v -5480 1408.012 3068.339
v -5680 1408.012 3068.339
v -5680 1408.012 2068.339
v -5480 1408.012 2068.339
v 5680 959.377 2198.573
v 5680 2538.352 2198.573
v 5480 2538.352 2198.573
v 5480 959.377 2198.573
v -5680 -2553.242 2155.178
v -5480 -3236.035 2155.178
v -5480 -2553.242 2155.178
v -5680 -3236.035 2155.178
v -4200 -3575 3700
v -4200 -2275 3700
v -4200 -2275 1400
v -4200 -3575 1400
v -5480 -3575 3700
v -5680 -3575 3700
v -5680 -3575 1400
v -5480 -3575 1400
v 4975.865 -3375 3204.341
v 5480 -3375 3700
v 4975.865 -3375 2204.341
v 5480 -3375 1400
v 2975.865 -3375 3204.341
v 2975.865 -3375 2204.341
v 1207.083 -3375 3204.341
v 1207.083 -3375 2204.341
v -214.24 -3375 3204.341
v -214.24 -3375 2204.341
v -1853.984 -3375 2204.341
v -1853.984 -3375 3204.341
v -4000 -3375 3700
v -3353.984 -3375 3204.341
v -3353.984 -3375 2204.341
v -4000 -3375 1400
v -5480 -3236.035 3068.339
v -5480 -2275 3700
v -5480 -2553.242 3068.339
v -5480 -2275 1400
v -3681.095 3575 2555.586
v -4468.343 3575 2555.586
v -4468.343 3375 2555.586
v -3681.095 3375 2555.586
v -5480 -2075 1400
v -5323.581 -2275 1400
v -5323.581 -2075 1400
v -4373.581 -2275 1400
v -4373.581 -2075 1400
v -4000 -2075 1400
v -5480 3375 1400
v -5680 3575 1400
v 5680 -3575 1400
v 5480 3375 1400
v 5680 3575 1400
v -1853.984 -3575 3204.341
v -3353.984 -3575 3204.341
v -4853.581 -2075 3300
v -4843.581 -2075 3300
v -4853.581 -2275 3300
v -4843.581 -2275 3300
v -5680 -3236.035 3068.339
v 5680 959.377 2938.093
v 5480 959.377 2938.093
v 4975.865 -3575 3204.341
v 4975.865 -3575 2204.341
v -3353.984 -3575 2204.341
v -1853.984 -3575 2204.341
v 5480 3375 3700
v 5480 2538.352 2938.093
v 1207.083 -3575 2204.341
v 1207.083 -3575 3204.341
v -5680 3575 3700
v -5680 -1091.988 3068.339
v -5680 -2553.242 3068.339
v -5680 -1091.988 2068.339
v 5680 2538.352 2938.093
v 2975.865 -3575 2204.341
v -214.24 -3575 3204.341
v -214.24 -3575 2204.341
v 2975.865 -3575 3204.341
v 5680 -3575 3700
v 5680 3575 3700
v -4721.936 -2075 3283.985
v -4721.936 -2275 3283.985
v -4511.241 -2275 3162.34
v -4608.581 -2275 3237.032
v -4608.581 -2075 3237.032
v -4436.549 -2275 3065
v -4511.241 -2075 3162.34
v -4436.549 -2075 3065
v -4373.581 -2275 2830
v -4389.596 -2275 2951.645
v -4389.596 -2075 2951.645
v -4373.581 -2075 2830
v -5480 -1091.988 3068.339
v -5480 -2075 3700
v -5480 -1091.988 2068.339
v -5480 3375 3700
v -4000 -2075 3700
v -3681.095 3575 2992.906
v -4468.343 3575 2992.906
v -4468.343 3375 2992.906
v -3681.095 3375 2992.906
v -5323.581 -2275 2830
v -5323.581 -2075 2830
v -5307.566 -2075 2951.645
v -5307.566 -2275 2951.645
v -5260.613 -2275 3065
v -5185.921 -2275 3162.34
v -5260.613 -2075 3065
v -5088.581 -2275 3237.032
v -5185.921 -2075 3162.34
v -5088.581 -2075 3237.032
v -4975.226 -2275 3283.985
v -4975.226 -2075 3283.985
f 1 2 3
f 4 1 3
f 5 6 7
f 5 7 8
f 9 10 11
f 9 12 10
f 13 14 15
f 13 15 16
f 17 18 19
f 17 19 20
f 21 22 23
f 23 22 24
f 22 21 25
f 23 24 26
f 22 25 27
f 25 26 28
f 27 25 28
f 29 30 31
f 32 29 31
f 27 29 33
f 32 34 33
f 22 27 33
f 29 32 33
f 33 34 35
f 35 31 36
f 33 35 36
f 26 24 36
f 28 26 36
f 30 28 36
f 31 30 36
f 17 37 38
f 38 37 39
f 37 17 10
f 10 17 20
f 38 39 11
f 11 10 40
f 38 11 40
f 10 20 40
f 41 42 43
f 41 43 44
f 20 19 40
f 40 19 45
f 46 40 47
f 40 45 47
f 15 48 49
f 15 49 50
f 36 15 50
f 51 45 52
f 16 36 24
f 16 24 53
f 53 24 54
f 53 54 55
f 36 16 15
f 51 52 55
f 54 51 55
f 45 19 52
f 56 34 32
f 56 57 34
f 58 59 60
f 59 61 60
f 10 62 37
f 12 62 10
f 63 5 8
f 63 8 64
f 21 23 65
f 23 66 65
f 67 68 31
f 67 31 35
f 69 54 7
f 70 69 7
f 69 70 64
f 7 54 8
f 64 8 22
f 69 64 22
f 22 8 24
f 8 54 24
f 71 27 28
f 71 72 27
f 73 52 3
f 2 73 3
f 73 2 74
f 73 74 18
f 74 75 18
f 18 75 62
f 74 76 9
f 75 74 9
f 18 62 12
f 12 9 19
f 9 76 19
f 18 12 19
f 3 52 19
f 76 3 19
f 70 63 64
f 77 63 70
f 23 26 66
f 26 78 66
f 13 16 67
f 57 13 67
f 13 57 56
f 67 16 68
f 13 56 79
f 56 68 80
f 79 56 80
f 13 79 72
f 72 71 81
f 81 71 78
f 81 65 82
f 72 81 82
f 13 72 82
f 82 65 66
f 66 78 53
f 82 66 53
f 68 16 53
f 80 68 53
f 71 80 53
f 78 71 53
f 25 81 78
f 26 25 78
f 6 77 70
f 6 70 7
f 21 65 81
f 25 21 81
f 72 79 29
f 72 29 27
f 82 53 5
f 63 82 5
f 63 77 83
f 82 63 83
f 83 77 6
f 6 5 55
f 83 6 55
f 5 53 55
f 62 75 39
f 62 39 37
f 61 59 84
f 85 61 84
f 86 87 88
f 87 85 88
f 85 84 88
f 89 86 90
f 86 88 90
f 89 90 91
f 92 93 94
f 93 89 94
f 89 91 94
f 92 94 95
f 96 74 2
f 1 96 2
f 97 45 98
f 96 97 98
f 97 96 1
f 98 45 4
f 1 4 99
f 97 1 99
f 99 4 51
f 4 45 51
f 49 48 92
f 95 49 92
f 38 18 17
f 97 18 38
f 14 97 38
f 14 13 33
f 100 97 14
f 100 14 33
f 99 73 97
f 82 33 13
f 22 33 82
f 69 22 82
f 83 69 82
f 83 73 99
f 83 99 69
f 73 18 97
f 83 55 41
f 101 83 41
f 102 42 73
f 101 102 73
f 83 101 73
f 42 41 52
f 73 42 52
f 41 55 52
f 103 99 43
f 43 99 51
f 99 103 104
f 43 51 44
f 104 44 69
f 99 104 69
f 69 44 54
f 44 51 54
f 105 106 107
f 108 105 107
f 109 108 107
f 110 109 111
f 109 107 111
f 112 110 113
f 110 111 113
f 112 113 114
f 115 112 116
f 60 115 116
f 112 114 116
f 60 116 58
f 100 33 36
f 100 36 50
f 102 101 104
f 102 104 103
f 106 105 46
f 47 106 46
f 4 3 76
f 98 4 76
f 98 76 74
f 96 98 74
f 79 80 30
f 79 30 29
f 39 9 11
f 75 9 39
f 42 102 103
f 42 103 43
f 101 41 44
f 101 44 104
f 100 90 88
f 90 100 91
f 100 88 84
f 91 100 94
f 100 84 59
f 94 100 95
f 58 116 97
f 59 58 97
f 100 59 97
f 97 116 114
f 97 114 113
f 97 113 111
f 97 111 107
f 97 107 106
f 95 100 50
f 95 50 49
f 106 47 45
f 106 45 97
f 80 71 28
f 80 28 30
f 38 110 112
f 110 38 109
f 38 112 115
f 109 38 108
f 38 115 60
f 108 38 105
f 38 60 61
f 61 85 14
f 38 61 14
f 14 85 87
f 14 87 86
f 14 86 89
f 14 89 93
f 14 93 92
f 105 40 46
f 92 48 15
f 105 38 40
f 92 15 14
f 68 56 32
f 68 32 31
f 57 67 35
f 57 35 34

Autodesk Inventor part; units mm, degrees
ref_plane "YZ Plane" through (0, 0, 0) normal (1, 0, 0) x (0, 1, 0)
ref_plane "XZ Plane" through (0, 0, 0) normal (0, 1, 0) x (-1, 0, 0)
ref_plane "XY Plane" through (0, 0, 0) normal (0, 0, 1) x (1, 0, 0)
ref_plane "Arbeitsebene1" through (0, 0, 1400) normal (0, 0, 1) x (1, 0, 0)
sketch "Skizze1" plane through (0, 0, 1400) normal (0, 0, 1) x (1, 0, 0)
  line L0 (-5480, -3575) -> (-5480, -2375) projected
  line L1 (-5480, -2375) -> (-4200, -2375) projected
  line L2 (-4200, -2375) -> (-4200, -3575) projected
  line L3 (-4200, -3575) -> (5680, -3575) projected
  line L4 (5680, -3575) -> (5680, 3575) projected
  line L5 (5680, 3575) -> (-5680, 3575) projected
  line L6 (-5680, 3575) -> (-5680, -3575) projected
  line L7 (-5680, -3575) -> (-5480, -3575) projected
  line L8 (-5680, 3575) -> (-5680, -3575)
  line L9 (-5480, -3575) -> (-5480, -2275)
  line L10 (-5480, -2275) -> (-4200, -2275)
  line L11 (-4200, -2275) -> (-4200, -3575)
  line L12 (5680, -3575) -> (5680, 3575)
  line L13 (-5680, 3575) -> (5680, 3575)
  line L14 (5680, -3575) -> (-4200, -3575)
  line L15 (-5480, 3375) -> (5480, 3375)
  line L16 (5480, 3375) -> (5480, -3375)
  line L17 (5480, -3375) -> (-4000, -3375)
  line L18 (-4000, -3375) -> (-4000, -2075)
  line L19 (-4000, -2075) -> (-5480, -2075)
  line L20 (-5480, -2075) -> (-5480, 3375)
  line L21 (-5680, -3575) -> (-5480, -3575)
  dimension "d1" = 200
  dimension "d2" = 200
  dimension "d3" = 200
  dimension "d4" = 200
  dimension "d5" = 200
  dimension "d6" = 1300
  dimension "d7" = 200
extrude "Extrusion1" add sketch "Skizze1" along normal blind 2300 contours L7 L6 L5 L4 L3 L2 L11 L10 L9 L0
sketch "Skizze2" plane through (-5480, -2275, 1400) normal (0, -1, 0) x (1, 0, 0)
  line L0 (0, 0) -> (1280, 0) projected
  line L1 (1280, 0) -> (1280, 2300) projected
  line L2 (0, 2300) -> (1280, 2300) projected
  line L3 (0, 0) -> (0, 2300) projected
  line L4 (0, 0) -> (1480, 0) projected
  line L5 (156.419, 0) -> (1106.419, 0)
  line L6 (1106.419, 0) -> (1106.419, 1900)
  line L7 (1106.419, 1900) -> (156.419, 1900)
  line L8 (156.419, 1900) -> (156.419, 0)
  dimension "d10" = 950
  dimension "d11" = 1900
extrude "Extrusion2" cut sketch "Skizze2" against normal up to surface (200 mm away) contours L8 L7 L6 L0
sketch "Skizze3" plane through (-4200, -3575, 1400) normal (0, -1, 0) x (1, 0, 0)
  line L0 (0, 0) -> (9880, 0) projected
  line L1 (9880, 0) -> (9880, 2300) projected
  line L2 (0, 2300) -> (9880, 2300) projected
  line L3 (0, 0) -> (0, 2300) projected
  line L4 (9175.8648, 1804.3408) -> (7175.8648, 1804.3408)
  line L5 (7175.8648, 1804.3408) -> (7175.8648, 804.3408)
  line L6 (7175.8648, 804.3408) -> (9175.8648, 804.3408)
  line L7 (9175.8648, 804.3408) -> (9175.8648, 1804.3408)
  line L8 (846.0156, 1804.3408) -> (2346.0156, 1804.3408)
  line L9 (2346.0156, 1804.3408) -> (2346.0156, 804.3408)
  line L10 (2346.0156, 804.3408) -> (846.0156, 804.3408)
  line L11 (846.0156, 804.3408) -> (846.0156, 1804.3408)
  line L12 (3985.7595, 1804.3408) -> (5407.0828, 1804.3408)
  line L13 (5407.0828, 1804.3408) -> (5407.0828, 804.3408)
  line L14 (5407.0828, 804.3408) -> (3985.7595, 804.3408)
  line L15 (3985.7595, 804.3408) -> (3985.7595, 1804.3408)
  dimension "d14" = 1000
  dimension "d15" = 2000
  dimension "d22" = 1500
extrude "Extrusion3" cut sketch "Skizze3" against normal up to surface (200 mm away) contours L7 L6 L5 L4 | L8 L9 L10 L11 | L12 L13 L14 L15
sketch "Skizze4" plane through (-5680, -3575, 1400) normal (-1, 0, 0) x (0, 0, 1)
  line L0 (0, 7150) -> (0, 0) projected
  line L1 (0, 0) -> (2300, 0) projected
  line L2 (2300, 7150) -> (2300, 0) projected
  line L3 (0, 7150) -> (2300, 7150) projected
  line L4 (1668.3393, 4983.0115) -> (668.3393, 4983.0115)
  line L5 (668.3393, 4983.0115) -> (668.3393, 2483.0115)
  line L6 (668.3393, 2483.0115) -> (1668.3393, 2483.0115)
  line L7 (1668.3393, 2483.0115) -> (1668.3393, 4983.0115)
  line L8 (1668.3393, 338.9652) -> (755.1778, 338.9652)
  line L9 (755.1778, 338.9652) -> (755.1778, 1021.7577)
  line L10 (755.1778, 1021.7577) -> (1668.3393, 1021.7577)
  line L11 (1668.3393, 1021.7577) -> (1668.3393, 338.9652)
  dimension "d18" = 2500
  dimension "d19" = 1000
extrude "Extrusion4" cut sketch "Skizze4" against normal up to surface (200 mm away) contours L7 L6 L5 L4 | L8 L9 L10 L11
sketch "Skizze5" plane through (5680, -3575, 1400) normal (1, 0, 0) x (0, 0, -1)
  line L0 (-1538.0926, 6113.3523) -> (-798.5727, 6113.3523)
  line L1 (-798.5727, 6113.3523) -> (-798.5727, 4534.3772)
  line L2 (-798.5727, 4534.3772) -> (-1538.0926, 4534.3772)
  line L3 (-1538.0926, 4534.3772) -> (-1538.0926, 6113.3523)
extrude "Extrusion5" cut sketch "Skizze5" against normal up to surface (200 mm away)
sketch "Skizze6" plane through (-5680, 3575, 1400) normal (0, 1, 0) x (1, 0, 0)
  line L0 (1998.9049, -1592.9058) -> (1211.657, -1592.9058)
  line L1 (1211.657, -1592.9058) -> (1211.657, -1155.5862)
  line L2 (1211.657, -1155.5862) -> (1998.9049, -1155.5862)
  line L3 (1998.9049, -1155.5862) -> (1998.9049, -1592.9058)
extrude "Extrusion6" cut sketch "Skizze6" against normal up to surface (200 mm away)
fillet "Rundung1" radius 470 2 edges at (-5323.581, -2175, 3300) (-4373.581, -2175, 3300)
properties part number "Aussenwand"
